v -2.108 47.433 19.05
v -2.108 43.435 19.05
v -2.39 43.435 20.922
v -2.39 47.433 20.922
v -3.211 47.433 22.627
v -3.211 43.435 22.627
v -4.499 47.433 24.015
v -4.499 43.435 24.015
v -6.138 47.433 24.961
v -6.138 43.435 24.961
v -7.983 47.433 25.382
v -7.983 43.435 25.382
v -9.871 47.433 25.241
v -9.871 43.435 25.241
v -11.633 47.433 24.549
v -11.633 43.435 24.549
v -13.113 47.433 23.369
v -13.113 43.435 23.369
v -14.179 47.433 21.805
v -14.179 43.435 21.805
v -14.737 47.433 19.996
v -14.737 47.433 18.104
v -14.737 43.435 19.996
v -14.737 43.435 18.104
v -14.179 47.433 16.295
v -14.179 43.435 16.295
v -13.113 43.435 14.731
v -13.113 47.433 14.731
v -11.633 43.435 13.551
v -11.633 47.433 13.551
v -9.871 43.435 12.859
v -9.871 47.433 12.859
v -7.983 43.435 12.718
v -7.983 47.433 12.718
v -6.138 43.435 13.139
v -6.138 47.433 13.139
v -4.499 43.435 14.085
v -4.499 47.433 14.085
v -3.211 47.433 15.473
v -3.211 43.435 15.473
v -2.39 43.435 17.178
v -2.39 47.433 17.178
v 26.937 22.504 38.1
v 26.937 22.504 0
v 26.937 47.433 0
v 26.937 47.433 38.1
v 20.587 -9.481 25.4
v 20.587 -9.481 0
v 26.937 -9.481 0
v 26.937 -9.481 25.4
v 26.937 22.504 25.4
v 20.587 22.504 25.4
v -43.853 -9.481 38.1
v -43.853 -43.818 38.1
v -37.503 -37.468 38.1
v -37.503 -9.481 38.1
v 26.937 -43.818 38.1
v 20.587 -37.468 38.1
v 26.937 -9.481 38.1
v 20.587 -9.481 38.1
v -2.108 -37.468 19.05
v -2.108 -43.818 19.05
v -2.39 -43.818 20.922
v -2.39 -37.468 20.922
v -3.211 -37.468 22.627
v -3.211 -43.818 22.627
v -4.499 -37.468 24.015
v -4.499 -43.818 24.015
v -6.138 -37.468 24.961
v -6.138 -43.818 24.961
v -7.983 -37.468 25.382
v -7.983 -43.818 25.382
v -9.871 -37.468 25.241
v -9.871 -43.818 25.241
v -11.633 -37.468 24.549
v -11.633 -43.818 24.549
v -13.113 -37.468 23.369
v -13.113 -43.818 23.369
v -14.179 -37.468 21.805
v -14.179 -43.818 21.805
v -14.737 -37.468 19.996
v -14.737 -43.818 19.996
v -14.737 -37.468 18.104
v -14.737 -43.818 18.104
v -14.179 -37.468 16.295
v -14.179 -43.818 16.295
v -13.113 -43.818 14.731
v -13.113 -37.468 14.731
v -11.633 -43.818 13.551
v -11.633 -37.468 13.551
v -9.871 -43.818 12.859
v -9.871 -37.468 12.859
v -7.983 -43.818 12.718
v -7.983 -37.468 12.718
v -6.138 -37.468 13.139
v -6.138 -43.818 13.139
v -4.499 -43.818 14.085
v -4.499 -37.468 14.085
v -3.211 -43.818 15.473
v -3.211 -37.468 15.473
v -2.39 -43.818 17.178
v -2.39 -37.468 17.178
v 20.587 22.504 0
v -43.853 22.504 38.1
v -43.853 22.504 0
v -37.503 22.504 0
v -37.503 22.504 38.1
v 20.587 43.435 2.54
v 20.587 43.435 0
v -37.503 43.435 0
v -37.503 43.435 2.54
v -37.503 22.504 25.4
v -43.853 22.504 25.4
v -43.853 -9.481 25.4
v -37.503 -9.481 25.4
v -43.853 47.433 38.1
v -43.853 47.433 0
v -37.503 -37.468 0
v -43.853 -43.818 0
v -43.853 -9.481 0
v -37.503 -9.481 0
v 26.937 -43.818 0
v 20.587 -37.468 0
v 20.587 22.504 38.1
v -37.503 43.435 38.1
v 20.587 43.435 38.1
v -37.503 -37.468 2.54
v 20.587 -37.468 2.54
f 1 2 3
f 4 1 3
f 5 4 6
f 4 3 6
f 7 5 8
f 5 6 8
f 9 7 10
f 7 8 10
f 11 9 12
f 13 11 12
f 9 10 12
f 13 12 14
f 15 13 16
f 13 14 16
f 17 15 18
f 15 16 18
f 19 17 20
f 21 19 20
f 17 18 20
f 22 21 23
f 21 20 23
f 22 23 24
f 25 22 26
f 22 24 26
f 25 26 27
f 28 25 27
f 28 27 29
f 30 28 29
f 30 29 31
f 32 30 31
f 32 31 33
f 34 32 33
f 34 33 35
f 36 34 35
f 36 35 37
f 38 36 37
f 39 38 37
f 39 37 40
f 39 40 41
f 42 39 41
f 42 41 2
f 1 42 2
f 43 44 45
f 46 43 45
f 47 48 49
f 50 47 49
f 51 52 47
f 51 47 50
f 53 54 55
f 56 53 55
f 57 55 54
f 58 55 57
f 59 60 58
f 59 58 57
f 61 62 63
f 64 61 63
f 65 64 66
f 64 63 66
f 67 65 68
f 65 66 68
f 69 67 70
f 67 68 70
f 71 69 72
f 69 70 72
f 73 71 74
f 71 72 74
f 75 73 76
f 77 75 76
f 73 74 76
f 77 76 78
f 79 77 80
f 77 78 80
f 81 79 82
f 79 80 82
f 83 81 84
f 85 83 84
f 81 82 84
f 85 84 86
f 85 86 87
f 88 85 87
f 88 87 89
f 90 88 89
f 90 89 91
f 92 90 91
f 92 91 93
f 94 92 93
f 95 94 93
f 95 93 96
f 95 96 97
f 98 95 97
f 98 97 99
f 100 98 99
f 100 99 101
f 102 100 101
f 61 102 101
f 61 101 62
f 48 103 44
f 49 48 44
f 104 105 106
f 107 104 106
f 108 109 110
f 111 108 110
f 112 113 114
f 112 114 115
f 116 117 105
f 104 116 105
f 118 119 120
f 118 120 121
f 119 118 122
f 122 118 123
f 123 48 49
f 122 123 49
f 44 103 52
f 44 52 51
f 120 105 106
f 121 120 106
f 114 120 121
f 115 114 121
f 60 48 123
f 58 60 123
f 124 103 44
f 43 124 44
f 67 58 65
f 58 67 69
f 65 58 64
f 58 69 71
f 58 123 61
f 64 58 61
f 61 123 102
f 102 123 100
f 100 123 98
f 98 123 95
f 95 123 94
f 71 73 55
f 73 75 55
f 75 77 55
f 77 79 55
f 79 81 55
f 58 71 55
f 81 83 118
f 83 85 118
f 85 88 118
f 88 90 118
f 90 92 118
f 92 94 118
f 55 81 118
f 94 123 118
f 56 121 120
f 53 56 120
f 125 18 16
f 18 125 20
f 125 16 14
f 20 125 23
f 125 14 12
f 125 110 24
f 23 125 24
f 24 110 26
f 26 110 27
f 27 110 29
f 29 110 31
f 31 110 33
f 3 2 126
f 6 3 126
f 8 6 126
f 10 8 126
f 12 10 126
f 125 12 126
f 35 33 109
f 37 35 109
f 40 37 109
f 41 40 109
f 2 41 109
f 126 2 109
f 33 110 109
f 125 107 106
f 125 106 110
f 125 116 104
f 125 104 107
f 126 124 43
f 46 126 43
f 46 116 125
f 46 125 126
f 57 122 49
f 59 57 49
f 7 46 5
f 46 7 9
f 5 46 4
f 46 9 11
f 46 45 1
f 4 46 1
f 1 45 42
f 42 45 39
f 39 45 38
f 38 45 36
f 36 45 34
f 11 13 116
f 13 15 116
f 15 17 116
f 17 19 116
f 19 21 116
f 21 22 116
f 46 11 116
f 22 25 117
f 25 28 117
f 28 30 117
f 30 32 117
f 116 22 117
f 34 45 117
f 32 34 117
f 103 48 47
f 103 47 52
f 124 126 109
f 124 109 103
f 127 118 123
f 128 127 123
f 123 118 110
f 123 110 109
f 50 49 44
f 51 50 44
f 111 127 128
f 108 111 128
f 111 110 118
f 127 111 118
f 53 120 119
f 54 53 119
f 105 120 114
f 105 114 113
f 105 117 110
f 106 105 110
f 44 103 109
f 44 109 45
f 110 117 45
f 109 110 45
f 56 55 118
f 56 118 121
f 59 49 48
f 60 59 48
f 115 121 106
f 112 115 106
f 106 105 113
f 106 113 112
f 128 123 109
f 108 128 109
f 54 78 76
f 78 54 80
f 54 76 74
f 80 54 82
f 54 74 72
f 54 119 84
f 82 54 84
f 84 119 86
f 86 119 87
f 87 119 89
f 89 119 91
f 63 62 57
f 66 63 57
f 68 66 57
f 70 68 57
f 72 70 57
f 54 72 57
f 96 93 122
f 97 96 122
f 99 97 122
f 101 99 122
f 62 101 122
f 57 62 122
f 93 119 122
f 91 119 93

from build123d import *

# Parameters (mm, degrees)
F1_DEPTH = 38.1
F0_W     = 6.35
F0_H     = 31.985192
F2_DEPTH = 25.4
F3_DEPTH = 2.54
F5_D     = 12.7


with BuildPart() as f1:
    # F0 (on Top) → F1 (new body)
    with BuildSketch(Plane.XY):
        Polygon((-37.5034, -9.481436), (-43.8534, -9.481436), (-43.8534, -43.818482), (26.937354, -43.818482), (26.937354, -9.481436), (20.587354, -9.481436), (20.587354, -37.46848), (-37.5034, -37.46848), align=None)
        Polygon((26.937354, 47.433388), (-43.8534, 47.433388), (-43.8534, 22.503756), (-37.5034, 22.503756), (-37.5034, 43.435241), (20.587354, 43.435241), (20.587354, 22.503756), (26.937354, 22.503756), align=None)
    extrude(amount=F1_DEPTH)

    # F5 (through all)
    with Locations(Plane(origin=(0, 47.433388, 0), x_dir=(-1, 0, 0), z_dir=(0, 1, 0))):
        with Locations((8.458023, 19.05)):
            Hole(F5_D / 2)


with BuildPart() as f2:
    # F0 (on Top) → F2 (new body)
    with BuildSketch(Plane.XY):
        with Locations((-40.6784, 6.51116)):
            Rectangle(F0_W, F0_H)
        with Locations((23.762354, 6.51116)):
            Rectangle(F0_W, F0_H)
    extrude(amount=F2_DEPTH)


with BuildPart() as f3:
    # F0 (on Top) → F3 (new body)
    with BuildSketch(Plane.XY):
        Polygon((-37.5034, 43.435241), (-37.5034, 22.503756), (-37.5034, -9.481436), (-37.5034, -37.46848), (20.587354, -37.46848), (20.587354, -9.481436), (20.587354, 22.503756), (20.587354, 43.435241), align=None)
    extrude(amount=F3_DEPTH)


solid = Compound([f1.part, f2.part, f3.part])
